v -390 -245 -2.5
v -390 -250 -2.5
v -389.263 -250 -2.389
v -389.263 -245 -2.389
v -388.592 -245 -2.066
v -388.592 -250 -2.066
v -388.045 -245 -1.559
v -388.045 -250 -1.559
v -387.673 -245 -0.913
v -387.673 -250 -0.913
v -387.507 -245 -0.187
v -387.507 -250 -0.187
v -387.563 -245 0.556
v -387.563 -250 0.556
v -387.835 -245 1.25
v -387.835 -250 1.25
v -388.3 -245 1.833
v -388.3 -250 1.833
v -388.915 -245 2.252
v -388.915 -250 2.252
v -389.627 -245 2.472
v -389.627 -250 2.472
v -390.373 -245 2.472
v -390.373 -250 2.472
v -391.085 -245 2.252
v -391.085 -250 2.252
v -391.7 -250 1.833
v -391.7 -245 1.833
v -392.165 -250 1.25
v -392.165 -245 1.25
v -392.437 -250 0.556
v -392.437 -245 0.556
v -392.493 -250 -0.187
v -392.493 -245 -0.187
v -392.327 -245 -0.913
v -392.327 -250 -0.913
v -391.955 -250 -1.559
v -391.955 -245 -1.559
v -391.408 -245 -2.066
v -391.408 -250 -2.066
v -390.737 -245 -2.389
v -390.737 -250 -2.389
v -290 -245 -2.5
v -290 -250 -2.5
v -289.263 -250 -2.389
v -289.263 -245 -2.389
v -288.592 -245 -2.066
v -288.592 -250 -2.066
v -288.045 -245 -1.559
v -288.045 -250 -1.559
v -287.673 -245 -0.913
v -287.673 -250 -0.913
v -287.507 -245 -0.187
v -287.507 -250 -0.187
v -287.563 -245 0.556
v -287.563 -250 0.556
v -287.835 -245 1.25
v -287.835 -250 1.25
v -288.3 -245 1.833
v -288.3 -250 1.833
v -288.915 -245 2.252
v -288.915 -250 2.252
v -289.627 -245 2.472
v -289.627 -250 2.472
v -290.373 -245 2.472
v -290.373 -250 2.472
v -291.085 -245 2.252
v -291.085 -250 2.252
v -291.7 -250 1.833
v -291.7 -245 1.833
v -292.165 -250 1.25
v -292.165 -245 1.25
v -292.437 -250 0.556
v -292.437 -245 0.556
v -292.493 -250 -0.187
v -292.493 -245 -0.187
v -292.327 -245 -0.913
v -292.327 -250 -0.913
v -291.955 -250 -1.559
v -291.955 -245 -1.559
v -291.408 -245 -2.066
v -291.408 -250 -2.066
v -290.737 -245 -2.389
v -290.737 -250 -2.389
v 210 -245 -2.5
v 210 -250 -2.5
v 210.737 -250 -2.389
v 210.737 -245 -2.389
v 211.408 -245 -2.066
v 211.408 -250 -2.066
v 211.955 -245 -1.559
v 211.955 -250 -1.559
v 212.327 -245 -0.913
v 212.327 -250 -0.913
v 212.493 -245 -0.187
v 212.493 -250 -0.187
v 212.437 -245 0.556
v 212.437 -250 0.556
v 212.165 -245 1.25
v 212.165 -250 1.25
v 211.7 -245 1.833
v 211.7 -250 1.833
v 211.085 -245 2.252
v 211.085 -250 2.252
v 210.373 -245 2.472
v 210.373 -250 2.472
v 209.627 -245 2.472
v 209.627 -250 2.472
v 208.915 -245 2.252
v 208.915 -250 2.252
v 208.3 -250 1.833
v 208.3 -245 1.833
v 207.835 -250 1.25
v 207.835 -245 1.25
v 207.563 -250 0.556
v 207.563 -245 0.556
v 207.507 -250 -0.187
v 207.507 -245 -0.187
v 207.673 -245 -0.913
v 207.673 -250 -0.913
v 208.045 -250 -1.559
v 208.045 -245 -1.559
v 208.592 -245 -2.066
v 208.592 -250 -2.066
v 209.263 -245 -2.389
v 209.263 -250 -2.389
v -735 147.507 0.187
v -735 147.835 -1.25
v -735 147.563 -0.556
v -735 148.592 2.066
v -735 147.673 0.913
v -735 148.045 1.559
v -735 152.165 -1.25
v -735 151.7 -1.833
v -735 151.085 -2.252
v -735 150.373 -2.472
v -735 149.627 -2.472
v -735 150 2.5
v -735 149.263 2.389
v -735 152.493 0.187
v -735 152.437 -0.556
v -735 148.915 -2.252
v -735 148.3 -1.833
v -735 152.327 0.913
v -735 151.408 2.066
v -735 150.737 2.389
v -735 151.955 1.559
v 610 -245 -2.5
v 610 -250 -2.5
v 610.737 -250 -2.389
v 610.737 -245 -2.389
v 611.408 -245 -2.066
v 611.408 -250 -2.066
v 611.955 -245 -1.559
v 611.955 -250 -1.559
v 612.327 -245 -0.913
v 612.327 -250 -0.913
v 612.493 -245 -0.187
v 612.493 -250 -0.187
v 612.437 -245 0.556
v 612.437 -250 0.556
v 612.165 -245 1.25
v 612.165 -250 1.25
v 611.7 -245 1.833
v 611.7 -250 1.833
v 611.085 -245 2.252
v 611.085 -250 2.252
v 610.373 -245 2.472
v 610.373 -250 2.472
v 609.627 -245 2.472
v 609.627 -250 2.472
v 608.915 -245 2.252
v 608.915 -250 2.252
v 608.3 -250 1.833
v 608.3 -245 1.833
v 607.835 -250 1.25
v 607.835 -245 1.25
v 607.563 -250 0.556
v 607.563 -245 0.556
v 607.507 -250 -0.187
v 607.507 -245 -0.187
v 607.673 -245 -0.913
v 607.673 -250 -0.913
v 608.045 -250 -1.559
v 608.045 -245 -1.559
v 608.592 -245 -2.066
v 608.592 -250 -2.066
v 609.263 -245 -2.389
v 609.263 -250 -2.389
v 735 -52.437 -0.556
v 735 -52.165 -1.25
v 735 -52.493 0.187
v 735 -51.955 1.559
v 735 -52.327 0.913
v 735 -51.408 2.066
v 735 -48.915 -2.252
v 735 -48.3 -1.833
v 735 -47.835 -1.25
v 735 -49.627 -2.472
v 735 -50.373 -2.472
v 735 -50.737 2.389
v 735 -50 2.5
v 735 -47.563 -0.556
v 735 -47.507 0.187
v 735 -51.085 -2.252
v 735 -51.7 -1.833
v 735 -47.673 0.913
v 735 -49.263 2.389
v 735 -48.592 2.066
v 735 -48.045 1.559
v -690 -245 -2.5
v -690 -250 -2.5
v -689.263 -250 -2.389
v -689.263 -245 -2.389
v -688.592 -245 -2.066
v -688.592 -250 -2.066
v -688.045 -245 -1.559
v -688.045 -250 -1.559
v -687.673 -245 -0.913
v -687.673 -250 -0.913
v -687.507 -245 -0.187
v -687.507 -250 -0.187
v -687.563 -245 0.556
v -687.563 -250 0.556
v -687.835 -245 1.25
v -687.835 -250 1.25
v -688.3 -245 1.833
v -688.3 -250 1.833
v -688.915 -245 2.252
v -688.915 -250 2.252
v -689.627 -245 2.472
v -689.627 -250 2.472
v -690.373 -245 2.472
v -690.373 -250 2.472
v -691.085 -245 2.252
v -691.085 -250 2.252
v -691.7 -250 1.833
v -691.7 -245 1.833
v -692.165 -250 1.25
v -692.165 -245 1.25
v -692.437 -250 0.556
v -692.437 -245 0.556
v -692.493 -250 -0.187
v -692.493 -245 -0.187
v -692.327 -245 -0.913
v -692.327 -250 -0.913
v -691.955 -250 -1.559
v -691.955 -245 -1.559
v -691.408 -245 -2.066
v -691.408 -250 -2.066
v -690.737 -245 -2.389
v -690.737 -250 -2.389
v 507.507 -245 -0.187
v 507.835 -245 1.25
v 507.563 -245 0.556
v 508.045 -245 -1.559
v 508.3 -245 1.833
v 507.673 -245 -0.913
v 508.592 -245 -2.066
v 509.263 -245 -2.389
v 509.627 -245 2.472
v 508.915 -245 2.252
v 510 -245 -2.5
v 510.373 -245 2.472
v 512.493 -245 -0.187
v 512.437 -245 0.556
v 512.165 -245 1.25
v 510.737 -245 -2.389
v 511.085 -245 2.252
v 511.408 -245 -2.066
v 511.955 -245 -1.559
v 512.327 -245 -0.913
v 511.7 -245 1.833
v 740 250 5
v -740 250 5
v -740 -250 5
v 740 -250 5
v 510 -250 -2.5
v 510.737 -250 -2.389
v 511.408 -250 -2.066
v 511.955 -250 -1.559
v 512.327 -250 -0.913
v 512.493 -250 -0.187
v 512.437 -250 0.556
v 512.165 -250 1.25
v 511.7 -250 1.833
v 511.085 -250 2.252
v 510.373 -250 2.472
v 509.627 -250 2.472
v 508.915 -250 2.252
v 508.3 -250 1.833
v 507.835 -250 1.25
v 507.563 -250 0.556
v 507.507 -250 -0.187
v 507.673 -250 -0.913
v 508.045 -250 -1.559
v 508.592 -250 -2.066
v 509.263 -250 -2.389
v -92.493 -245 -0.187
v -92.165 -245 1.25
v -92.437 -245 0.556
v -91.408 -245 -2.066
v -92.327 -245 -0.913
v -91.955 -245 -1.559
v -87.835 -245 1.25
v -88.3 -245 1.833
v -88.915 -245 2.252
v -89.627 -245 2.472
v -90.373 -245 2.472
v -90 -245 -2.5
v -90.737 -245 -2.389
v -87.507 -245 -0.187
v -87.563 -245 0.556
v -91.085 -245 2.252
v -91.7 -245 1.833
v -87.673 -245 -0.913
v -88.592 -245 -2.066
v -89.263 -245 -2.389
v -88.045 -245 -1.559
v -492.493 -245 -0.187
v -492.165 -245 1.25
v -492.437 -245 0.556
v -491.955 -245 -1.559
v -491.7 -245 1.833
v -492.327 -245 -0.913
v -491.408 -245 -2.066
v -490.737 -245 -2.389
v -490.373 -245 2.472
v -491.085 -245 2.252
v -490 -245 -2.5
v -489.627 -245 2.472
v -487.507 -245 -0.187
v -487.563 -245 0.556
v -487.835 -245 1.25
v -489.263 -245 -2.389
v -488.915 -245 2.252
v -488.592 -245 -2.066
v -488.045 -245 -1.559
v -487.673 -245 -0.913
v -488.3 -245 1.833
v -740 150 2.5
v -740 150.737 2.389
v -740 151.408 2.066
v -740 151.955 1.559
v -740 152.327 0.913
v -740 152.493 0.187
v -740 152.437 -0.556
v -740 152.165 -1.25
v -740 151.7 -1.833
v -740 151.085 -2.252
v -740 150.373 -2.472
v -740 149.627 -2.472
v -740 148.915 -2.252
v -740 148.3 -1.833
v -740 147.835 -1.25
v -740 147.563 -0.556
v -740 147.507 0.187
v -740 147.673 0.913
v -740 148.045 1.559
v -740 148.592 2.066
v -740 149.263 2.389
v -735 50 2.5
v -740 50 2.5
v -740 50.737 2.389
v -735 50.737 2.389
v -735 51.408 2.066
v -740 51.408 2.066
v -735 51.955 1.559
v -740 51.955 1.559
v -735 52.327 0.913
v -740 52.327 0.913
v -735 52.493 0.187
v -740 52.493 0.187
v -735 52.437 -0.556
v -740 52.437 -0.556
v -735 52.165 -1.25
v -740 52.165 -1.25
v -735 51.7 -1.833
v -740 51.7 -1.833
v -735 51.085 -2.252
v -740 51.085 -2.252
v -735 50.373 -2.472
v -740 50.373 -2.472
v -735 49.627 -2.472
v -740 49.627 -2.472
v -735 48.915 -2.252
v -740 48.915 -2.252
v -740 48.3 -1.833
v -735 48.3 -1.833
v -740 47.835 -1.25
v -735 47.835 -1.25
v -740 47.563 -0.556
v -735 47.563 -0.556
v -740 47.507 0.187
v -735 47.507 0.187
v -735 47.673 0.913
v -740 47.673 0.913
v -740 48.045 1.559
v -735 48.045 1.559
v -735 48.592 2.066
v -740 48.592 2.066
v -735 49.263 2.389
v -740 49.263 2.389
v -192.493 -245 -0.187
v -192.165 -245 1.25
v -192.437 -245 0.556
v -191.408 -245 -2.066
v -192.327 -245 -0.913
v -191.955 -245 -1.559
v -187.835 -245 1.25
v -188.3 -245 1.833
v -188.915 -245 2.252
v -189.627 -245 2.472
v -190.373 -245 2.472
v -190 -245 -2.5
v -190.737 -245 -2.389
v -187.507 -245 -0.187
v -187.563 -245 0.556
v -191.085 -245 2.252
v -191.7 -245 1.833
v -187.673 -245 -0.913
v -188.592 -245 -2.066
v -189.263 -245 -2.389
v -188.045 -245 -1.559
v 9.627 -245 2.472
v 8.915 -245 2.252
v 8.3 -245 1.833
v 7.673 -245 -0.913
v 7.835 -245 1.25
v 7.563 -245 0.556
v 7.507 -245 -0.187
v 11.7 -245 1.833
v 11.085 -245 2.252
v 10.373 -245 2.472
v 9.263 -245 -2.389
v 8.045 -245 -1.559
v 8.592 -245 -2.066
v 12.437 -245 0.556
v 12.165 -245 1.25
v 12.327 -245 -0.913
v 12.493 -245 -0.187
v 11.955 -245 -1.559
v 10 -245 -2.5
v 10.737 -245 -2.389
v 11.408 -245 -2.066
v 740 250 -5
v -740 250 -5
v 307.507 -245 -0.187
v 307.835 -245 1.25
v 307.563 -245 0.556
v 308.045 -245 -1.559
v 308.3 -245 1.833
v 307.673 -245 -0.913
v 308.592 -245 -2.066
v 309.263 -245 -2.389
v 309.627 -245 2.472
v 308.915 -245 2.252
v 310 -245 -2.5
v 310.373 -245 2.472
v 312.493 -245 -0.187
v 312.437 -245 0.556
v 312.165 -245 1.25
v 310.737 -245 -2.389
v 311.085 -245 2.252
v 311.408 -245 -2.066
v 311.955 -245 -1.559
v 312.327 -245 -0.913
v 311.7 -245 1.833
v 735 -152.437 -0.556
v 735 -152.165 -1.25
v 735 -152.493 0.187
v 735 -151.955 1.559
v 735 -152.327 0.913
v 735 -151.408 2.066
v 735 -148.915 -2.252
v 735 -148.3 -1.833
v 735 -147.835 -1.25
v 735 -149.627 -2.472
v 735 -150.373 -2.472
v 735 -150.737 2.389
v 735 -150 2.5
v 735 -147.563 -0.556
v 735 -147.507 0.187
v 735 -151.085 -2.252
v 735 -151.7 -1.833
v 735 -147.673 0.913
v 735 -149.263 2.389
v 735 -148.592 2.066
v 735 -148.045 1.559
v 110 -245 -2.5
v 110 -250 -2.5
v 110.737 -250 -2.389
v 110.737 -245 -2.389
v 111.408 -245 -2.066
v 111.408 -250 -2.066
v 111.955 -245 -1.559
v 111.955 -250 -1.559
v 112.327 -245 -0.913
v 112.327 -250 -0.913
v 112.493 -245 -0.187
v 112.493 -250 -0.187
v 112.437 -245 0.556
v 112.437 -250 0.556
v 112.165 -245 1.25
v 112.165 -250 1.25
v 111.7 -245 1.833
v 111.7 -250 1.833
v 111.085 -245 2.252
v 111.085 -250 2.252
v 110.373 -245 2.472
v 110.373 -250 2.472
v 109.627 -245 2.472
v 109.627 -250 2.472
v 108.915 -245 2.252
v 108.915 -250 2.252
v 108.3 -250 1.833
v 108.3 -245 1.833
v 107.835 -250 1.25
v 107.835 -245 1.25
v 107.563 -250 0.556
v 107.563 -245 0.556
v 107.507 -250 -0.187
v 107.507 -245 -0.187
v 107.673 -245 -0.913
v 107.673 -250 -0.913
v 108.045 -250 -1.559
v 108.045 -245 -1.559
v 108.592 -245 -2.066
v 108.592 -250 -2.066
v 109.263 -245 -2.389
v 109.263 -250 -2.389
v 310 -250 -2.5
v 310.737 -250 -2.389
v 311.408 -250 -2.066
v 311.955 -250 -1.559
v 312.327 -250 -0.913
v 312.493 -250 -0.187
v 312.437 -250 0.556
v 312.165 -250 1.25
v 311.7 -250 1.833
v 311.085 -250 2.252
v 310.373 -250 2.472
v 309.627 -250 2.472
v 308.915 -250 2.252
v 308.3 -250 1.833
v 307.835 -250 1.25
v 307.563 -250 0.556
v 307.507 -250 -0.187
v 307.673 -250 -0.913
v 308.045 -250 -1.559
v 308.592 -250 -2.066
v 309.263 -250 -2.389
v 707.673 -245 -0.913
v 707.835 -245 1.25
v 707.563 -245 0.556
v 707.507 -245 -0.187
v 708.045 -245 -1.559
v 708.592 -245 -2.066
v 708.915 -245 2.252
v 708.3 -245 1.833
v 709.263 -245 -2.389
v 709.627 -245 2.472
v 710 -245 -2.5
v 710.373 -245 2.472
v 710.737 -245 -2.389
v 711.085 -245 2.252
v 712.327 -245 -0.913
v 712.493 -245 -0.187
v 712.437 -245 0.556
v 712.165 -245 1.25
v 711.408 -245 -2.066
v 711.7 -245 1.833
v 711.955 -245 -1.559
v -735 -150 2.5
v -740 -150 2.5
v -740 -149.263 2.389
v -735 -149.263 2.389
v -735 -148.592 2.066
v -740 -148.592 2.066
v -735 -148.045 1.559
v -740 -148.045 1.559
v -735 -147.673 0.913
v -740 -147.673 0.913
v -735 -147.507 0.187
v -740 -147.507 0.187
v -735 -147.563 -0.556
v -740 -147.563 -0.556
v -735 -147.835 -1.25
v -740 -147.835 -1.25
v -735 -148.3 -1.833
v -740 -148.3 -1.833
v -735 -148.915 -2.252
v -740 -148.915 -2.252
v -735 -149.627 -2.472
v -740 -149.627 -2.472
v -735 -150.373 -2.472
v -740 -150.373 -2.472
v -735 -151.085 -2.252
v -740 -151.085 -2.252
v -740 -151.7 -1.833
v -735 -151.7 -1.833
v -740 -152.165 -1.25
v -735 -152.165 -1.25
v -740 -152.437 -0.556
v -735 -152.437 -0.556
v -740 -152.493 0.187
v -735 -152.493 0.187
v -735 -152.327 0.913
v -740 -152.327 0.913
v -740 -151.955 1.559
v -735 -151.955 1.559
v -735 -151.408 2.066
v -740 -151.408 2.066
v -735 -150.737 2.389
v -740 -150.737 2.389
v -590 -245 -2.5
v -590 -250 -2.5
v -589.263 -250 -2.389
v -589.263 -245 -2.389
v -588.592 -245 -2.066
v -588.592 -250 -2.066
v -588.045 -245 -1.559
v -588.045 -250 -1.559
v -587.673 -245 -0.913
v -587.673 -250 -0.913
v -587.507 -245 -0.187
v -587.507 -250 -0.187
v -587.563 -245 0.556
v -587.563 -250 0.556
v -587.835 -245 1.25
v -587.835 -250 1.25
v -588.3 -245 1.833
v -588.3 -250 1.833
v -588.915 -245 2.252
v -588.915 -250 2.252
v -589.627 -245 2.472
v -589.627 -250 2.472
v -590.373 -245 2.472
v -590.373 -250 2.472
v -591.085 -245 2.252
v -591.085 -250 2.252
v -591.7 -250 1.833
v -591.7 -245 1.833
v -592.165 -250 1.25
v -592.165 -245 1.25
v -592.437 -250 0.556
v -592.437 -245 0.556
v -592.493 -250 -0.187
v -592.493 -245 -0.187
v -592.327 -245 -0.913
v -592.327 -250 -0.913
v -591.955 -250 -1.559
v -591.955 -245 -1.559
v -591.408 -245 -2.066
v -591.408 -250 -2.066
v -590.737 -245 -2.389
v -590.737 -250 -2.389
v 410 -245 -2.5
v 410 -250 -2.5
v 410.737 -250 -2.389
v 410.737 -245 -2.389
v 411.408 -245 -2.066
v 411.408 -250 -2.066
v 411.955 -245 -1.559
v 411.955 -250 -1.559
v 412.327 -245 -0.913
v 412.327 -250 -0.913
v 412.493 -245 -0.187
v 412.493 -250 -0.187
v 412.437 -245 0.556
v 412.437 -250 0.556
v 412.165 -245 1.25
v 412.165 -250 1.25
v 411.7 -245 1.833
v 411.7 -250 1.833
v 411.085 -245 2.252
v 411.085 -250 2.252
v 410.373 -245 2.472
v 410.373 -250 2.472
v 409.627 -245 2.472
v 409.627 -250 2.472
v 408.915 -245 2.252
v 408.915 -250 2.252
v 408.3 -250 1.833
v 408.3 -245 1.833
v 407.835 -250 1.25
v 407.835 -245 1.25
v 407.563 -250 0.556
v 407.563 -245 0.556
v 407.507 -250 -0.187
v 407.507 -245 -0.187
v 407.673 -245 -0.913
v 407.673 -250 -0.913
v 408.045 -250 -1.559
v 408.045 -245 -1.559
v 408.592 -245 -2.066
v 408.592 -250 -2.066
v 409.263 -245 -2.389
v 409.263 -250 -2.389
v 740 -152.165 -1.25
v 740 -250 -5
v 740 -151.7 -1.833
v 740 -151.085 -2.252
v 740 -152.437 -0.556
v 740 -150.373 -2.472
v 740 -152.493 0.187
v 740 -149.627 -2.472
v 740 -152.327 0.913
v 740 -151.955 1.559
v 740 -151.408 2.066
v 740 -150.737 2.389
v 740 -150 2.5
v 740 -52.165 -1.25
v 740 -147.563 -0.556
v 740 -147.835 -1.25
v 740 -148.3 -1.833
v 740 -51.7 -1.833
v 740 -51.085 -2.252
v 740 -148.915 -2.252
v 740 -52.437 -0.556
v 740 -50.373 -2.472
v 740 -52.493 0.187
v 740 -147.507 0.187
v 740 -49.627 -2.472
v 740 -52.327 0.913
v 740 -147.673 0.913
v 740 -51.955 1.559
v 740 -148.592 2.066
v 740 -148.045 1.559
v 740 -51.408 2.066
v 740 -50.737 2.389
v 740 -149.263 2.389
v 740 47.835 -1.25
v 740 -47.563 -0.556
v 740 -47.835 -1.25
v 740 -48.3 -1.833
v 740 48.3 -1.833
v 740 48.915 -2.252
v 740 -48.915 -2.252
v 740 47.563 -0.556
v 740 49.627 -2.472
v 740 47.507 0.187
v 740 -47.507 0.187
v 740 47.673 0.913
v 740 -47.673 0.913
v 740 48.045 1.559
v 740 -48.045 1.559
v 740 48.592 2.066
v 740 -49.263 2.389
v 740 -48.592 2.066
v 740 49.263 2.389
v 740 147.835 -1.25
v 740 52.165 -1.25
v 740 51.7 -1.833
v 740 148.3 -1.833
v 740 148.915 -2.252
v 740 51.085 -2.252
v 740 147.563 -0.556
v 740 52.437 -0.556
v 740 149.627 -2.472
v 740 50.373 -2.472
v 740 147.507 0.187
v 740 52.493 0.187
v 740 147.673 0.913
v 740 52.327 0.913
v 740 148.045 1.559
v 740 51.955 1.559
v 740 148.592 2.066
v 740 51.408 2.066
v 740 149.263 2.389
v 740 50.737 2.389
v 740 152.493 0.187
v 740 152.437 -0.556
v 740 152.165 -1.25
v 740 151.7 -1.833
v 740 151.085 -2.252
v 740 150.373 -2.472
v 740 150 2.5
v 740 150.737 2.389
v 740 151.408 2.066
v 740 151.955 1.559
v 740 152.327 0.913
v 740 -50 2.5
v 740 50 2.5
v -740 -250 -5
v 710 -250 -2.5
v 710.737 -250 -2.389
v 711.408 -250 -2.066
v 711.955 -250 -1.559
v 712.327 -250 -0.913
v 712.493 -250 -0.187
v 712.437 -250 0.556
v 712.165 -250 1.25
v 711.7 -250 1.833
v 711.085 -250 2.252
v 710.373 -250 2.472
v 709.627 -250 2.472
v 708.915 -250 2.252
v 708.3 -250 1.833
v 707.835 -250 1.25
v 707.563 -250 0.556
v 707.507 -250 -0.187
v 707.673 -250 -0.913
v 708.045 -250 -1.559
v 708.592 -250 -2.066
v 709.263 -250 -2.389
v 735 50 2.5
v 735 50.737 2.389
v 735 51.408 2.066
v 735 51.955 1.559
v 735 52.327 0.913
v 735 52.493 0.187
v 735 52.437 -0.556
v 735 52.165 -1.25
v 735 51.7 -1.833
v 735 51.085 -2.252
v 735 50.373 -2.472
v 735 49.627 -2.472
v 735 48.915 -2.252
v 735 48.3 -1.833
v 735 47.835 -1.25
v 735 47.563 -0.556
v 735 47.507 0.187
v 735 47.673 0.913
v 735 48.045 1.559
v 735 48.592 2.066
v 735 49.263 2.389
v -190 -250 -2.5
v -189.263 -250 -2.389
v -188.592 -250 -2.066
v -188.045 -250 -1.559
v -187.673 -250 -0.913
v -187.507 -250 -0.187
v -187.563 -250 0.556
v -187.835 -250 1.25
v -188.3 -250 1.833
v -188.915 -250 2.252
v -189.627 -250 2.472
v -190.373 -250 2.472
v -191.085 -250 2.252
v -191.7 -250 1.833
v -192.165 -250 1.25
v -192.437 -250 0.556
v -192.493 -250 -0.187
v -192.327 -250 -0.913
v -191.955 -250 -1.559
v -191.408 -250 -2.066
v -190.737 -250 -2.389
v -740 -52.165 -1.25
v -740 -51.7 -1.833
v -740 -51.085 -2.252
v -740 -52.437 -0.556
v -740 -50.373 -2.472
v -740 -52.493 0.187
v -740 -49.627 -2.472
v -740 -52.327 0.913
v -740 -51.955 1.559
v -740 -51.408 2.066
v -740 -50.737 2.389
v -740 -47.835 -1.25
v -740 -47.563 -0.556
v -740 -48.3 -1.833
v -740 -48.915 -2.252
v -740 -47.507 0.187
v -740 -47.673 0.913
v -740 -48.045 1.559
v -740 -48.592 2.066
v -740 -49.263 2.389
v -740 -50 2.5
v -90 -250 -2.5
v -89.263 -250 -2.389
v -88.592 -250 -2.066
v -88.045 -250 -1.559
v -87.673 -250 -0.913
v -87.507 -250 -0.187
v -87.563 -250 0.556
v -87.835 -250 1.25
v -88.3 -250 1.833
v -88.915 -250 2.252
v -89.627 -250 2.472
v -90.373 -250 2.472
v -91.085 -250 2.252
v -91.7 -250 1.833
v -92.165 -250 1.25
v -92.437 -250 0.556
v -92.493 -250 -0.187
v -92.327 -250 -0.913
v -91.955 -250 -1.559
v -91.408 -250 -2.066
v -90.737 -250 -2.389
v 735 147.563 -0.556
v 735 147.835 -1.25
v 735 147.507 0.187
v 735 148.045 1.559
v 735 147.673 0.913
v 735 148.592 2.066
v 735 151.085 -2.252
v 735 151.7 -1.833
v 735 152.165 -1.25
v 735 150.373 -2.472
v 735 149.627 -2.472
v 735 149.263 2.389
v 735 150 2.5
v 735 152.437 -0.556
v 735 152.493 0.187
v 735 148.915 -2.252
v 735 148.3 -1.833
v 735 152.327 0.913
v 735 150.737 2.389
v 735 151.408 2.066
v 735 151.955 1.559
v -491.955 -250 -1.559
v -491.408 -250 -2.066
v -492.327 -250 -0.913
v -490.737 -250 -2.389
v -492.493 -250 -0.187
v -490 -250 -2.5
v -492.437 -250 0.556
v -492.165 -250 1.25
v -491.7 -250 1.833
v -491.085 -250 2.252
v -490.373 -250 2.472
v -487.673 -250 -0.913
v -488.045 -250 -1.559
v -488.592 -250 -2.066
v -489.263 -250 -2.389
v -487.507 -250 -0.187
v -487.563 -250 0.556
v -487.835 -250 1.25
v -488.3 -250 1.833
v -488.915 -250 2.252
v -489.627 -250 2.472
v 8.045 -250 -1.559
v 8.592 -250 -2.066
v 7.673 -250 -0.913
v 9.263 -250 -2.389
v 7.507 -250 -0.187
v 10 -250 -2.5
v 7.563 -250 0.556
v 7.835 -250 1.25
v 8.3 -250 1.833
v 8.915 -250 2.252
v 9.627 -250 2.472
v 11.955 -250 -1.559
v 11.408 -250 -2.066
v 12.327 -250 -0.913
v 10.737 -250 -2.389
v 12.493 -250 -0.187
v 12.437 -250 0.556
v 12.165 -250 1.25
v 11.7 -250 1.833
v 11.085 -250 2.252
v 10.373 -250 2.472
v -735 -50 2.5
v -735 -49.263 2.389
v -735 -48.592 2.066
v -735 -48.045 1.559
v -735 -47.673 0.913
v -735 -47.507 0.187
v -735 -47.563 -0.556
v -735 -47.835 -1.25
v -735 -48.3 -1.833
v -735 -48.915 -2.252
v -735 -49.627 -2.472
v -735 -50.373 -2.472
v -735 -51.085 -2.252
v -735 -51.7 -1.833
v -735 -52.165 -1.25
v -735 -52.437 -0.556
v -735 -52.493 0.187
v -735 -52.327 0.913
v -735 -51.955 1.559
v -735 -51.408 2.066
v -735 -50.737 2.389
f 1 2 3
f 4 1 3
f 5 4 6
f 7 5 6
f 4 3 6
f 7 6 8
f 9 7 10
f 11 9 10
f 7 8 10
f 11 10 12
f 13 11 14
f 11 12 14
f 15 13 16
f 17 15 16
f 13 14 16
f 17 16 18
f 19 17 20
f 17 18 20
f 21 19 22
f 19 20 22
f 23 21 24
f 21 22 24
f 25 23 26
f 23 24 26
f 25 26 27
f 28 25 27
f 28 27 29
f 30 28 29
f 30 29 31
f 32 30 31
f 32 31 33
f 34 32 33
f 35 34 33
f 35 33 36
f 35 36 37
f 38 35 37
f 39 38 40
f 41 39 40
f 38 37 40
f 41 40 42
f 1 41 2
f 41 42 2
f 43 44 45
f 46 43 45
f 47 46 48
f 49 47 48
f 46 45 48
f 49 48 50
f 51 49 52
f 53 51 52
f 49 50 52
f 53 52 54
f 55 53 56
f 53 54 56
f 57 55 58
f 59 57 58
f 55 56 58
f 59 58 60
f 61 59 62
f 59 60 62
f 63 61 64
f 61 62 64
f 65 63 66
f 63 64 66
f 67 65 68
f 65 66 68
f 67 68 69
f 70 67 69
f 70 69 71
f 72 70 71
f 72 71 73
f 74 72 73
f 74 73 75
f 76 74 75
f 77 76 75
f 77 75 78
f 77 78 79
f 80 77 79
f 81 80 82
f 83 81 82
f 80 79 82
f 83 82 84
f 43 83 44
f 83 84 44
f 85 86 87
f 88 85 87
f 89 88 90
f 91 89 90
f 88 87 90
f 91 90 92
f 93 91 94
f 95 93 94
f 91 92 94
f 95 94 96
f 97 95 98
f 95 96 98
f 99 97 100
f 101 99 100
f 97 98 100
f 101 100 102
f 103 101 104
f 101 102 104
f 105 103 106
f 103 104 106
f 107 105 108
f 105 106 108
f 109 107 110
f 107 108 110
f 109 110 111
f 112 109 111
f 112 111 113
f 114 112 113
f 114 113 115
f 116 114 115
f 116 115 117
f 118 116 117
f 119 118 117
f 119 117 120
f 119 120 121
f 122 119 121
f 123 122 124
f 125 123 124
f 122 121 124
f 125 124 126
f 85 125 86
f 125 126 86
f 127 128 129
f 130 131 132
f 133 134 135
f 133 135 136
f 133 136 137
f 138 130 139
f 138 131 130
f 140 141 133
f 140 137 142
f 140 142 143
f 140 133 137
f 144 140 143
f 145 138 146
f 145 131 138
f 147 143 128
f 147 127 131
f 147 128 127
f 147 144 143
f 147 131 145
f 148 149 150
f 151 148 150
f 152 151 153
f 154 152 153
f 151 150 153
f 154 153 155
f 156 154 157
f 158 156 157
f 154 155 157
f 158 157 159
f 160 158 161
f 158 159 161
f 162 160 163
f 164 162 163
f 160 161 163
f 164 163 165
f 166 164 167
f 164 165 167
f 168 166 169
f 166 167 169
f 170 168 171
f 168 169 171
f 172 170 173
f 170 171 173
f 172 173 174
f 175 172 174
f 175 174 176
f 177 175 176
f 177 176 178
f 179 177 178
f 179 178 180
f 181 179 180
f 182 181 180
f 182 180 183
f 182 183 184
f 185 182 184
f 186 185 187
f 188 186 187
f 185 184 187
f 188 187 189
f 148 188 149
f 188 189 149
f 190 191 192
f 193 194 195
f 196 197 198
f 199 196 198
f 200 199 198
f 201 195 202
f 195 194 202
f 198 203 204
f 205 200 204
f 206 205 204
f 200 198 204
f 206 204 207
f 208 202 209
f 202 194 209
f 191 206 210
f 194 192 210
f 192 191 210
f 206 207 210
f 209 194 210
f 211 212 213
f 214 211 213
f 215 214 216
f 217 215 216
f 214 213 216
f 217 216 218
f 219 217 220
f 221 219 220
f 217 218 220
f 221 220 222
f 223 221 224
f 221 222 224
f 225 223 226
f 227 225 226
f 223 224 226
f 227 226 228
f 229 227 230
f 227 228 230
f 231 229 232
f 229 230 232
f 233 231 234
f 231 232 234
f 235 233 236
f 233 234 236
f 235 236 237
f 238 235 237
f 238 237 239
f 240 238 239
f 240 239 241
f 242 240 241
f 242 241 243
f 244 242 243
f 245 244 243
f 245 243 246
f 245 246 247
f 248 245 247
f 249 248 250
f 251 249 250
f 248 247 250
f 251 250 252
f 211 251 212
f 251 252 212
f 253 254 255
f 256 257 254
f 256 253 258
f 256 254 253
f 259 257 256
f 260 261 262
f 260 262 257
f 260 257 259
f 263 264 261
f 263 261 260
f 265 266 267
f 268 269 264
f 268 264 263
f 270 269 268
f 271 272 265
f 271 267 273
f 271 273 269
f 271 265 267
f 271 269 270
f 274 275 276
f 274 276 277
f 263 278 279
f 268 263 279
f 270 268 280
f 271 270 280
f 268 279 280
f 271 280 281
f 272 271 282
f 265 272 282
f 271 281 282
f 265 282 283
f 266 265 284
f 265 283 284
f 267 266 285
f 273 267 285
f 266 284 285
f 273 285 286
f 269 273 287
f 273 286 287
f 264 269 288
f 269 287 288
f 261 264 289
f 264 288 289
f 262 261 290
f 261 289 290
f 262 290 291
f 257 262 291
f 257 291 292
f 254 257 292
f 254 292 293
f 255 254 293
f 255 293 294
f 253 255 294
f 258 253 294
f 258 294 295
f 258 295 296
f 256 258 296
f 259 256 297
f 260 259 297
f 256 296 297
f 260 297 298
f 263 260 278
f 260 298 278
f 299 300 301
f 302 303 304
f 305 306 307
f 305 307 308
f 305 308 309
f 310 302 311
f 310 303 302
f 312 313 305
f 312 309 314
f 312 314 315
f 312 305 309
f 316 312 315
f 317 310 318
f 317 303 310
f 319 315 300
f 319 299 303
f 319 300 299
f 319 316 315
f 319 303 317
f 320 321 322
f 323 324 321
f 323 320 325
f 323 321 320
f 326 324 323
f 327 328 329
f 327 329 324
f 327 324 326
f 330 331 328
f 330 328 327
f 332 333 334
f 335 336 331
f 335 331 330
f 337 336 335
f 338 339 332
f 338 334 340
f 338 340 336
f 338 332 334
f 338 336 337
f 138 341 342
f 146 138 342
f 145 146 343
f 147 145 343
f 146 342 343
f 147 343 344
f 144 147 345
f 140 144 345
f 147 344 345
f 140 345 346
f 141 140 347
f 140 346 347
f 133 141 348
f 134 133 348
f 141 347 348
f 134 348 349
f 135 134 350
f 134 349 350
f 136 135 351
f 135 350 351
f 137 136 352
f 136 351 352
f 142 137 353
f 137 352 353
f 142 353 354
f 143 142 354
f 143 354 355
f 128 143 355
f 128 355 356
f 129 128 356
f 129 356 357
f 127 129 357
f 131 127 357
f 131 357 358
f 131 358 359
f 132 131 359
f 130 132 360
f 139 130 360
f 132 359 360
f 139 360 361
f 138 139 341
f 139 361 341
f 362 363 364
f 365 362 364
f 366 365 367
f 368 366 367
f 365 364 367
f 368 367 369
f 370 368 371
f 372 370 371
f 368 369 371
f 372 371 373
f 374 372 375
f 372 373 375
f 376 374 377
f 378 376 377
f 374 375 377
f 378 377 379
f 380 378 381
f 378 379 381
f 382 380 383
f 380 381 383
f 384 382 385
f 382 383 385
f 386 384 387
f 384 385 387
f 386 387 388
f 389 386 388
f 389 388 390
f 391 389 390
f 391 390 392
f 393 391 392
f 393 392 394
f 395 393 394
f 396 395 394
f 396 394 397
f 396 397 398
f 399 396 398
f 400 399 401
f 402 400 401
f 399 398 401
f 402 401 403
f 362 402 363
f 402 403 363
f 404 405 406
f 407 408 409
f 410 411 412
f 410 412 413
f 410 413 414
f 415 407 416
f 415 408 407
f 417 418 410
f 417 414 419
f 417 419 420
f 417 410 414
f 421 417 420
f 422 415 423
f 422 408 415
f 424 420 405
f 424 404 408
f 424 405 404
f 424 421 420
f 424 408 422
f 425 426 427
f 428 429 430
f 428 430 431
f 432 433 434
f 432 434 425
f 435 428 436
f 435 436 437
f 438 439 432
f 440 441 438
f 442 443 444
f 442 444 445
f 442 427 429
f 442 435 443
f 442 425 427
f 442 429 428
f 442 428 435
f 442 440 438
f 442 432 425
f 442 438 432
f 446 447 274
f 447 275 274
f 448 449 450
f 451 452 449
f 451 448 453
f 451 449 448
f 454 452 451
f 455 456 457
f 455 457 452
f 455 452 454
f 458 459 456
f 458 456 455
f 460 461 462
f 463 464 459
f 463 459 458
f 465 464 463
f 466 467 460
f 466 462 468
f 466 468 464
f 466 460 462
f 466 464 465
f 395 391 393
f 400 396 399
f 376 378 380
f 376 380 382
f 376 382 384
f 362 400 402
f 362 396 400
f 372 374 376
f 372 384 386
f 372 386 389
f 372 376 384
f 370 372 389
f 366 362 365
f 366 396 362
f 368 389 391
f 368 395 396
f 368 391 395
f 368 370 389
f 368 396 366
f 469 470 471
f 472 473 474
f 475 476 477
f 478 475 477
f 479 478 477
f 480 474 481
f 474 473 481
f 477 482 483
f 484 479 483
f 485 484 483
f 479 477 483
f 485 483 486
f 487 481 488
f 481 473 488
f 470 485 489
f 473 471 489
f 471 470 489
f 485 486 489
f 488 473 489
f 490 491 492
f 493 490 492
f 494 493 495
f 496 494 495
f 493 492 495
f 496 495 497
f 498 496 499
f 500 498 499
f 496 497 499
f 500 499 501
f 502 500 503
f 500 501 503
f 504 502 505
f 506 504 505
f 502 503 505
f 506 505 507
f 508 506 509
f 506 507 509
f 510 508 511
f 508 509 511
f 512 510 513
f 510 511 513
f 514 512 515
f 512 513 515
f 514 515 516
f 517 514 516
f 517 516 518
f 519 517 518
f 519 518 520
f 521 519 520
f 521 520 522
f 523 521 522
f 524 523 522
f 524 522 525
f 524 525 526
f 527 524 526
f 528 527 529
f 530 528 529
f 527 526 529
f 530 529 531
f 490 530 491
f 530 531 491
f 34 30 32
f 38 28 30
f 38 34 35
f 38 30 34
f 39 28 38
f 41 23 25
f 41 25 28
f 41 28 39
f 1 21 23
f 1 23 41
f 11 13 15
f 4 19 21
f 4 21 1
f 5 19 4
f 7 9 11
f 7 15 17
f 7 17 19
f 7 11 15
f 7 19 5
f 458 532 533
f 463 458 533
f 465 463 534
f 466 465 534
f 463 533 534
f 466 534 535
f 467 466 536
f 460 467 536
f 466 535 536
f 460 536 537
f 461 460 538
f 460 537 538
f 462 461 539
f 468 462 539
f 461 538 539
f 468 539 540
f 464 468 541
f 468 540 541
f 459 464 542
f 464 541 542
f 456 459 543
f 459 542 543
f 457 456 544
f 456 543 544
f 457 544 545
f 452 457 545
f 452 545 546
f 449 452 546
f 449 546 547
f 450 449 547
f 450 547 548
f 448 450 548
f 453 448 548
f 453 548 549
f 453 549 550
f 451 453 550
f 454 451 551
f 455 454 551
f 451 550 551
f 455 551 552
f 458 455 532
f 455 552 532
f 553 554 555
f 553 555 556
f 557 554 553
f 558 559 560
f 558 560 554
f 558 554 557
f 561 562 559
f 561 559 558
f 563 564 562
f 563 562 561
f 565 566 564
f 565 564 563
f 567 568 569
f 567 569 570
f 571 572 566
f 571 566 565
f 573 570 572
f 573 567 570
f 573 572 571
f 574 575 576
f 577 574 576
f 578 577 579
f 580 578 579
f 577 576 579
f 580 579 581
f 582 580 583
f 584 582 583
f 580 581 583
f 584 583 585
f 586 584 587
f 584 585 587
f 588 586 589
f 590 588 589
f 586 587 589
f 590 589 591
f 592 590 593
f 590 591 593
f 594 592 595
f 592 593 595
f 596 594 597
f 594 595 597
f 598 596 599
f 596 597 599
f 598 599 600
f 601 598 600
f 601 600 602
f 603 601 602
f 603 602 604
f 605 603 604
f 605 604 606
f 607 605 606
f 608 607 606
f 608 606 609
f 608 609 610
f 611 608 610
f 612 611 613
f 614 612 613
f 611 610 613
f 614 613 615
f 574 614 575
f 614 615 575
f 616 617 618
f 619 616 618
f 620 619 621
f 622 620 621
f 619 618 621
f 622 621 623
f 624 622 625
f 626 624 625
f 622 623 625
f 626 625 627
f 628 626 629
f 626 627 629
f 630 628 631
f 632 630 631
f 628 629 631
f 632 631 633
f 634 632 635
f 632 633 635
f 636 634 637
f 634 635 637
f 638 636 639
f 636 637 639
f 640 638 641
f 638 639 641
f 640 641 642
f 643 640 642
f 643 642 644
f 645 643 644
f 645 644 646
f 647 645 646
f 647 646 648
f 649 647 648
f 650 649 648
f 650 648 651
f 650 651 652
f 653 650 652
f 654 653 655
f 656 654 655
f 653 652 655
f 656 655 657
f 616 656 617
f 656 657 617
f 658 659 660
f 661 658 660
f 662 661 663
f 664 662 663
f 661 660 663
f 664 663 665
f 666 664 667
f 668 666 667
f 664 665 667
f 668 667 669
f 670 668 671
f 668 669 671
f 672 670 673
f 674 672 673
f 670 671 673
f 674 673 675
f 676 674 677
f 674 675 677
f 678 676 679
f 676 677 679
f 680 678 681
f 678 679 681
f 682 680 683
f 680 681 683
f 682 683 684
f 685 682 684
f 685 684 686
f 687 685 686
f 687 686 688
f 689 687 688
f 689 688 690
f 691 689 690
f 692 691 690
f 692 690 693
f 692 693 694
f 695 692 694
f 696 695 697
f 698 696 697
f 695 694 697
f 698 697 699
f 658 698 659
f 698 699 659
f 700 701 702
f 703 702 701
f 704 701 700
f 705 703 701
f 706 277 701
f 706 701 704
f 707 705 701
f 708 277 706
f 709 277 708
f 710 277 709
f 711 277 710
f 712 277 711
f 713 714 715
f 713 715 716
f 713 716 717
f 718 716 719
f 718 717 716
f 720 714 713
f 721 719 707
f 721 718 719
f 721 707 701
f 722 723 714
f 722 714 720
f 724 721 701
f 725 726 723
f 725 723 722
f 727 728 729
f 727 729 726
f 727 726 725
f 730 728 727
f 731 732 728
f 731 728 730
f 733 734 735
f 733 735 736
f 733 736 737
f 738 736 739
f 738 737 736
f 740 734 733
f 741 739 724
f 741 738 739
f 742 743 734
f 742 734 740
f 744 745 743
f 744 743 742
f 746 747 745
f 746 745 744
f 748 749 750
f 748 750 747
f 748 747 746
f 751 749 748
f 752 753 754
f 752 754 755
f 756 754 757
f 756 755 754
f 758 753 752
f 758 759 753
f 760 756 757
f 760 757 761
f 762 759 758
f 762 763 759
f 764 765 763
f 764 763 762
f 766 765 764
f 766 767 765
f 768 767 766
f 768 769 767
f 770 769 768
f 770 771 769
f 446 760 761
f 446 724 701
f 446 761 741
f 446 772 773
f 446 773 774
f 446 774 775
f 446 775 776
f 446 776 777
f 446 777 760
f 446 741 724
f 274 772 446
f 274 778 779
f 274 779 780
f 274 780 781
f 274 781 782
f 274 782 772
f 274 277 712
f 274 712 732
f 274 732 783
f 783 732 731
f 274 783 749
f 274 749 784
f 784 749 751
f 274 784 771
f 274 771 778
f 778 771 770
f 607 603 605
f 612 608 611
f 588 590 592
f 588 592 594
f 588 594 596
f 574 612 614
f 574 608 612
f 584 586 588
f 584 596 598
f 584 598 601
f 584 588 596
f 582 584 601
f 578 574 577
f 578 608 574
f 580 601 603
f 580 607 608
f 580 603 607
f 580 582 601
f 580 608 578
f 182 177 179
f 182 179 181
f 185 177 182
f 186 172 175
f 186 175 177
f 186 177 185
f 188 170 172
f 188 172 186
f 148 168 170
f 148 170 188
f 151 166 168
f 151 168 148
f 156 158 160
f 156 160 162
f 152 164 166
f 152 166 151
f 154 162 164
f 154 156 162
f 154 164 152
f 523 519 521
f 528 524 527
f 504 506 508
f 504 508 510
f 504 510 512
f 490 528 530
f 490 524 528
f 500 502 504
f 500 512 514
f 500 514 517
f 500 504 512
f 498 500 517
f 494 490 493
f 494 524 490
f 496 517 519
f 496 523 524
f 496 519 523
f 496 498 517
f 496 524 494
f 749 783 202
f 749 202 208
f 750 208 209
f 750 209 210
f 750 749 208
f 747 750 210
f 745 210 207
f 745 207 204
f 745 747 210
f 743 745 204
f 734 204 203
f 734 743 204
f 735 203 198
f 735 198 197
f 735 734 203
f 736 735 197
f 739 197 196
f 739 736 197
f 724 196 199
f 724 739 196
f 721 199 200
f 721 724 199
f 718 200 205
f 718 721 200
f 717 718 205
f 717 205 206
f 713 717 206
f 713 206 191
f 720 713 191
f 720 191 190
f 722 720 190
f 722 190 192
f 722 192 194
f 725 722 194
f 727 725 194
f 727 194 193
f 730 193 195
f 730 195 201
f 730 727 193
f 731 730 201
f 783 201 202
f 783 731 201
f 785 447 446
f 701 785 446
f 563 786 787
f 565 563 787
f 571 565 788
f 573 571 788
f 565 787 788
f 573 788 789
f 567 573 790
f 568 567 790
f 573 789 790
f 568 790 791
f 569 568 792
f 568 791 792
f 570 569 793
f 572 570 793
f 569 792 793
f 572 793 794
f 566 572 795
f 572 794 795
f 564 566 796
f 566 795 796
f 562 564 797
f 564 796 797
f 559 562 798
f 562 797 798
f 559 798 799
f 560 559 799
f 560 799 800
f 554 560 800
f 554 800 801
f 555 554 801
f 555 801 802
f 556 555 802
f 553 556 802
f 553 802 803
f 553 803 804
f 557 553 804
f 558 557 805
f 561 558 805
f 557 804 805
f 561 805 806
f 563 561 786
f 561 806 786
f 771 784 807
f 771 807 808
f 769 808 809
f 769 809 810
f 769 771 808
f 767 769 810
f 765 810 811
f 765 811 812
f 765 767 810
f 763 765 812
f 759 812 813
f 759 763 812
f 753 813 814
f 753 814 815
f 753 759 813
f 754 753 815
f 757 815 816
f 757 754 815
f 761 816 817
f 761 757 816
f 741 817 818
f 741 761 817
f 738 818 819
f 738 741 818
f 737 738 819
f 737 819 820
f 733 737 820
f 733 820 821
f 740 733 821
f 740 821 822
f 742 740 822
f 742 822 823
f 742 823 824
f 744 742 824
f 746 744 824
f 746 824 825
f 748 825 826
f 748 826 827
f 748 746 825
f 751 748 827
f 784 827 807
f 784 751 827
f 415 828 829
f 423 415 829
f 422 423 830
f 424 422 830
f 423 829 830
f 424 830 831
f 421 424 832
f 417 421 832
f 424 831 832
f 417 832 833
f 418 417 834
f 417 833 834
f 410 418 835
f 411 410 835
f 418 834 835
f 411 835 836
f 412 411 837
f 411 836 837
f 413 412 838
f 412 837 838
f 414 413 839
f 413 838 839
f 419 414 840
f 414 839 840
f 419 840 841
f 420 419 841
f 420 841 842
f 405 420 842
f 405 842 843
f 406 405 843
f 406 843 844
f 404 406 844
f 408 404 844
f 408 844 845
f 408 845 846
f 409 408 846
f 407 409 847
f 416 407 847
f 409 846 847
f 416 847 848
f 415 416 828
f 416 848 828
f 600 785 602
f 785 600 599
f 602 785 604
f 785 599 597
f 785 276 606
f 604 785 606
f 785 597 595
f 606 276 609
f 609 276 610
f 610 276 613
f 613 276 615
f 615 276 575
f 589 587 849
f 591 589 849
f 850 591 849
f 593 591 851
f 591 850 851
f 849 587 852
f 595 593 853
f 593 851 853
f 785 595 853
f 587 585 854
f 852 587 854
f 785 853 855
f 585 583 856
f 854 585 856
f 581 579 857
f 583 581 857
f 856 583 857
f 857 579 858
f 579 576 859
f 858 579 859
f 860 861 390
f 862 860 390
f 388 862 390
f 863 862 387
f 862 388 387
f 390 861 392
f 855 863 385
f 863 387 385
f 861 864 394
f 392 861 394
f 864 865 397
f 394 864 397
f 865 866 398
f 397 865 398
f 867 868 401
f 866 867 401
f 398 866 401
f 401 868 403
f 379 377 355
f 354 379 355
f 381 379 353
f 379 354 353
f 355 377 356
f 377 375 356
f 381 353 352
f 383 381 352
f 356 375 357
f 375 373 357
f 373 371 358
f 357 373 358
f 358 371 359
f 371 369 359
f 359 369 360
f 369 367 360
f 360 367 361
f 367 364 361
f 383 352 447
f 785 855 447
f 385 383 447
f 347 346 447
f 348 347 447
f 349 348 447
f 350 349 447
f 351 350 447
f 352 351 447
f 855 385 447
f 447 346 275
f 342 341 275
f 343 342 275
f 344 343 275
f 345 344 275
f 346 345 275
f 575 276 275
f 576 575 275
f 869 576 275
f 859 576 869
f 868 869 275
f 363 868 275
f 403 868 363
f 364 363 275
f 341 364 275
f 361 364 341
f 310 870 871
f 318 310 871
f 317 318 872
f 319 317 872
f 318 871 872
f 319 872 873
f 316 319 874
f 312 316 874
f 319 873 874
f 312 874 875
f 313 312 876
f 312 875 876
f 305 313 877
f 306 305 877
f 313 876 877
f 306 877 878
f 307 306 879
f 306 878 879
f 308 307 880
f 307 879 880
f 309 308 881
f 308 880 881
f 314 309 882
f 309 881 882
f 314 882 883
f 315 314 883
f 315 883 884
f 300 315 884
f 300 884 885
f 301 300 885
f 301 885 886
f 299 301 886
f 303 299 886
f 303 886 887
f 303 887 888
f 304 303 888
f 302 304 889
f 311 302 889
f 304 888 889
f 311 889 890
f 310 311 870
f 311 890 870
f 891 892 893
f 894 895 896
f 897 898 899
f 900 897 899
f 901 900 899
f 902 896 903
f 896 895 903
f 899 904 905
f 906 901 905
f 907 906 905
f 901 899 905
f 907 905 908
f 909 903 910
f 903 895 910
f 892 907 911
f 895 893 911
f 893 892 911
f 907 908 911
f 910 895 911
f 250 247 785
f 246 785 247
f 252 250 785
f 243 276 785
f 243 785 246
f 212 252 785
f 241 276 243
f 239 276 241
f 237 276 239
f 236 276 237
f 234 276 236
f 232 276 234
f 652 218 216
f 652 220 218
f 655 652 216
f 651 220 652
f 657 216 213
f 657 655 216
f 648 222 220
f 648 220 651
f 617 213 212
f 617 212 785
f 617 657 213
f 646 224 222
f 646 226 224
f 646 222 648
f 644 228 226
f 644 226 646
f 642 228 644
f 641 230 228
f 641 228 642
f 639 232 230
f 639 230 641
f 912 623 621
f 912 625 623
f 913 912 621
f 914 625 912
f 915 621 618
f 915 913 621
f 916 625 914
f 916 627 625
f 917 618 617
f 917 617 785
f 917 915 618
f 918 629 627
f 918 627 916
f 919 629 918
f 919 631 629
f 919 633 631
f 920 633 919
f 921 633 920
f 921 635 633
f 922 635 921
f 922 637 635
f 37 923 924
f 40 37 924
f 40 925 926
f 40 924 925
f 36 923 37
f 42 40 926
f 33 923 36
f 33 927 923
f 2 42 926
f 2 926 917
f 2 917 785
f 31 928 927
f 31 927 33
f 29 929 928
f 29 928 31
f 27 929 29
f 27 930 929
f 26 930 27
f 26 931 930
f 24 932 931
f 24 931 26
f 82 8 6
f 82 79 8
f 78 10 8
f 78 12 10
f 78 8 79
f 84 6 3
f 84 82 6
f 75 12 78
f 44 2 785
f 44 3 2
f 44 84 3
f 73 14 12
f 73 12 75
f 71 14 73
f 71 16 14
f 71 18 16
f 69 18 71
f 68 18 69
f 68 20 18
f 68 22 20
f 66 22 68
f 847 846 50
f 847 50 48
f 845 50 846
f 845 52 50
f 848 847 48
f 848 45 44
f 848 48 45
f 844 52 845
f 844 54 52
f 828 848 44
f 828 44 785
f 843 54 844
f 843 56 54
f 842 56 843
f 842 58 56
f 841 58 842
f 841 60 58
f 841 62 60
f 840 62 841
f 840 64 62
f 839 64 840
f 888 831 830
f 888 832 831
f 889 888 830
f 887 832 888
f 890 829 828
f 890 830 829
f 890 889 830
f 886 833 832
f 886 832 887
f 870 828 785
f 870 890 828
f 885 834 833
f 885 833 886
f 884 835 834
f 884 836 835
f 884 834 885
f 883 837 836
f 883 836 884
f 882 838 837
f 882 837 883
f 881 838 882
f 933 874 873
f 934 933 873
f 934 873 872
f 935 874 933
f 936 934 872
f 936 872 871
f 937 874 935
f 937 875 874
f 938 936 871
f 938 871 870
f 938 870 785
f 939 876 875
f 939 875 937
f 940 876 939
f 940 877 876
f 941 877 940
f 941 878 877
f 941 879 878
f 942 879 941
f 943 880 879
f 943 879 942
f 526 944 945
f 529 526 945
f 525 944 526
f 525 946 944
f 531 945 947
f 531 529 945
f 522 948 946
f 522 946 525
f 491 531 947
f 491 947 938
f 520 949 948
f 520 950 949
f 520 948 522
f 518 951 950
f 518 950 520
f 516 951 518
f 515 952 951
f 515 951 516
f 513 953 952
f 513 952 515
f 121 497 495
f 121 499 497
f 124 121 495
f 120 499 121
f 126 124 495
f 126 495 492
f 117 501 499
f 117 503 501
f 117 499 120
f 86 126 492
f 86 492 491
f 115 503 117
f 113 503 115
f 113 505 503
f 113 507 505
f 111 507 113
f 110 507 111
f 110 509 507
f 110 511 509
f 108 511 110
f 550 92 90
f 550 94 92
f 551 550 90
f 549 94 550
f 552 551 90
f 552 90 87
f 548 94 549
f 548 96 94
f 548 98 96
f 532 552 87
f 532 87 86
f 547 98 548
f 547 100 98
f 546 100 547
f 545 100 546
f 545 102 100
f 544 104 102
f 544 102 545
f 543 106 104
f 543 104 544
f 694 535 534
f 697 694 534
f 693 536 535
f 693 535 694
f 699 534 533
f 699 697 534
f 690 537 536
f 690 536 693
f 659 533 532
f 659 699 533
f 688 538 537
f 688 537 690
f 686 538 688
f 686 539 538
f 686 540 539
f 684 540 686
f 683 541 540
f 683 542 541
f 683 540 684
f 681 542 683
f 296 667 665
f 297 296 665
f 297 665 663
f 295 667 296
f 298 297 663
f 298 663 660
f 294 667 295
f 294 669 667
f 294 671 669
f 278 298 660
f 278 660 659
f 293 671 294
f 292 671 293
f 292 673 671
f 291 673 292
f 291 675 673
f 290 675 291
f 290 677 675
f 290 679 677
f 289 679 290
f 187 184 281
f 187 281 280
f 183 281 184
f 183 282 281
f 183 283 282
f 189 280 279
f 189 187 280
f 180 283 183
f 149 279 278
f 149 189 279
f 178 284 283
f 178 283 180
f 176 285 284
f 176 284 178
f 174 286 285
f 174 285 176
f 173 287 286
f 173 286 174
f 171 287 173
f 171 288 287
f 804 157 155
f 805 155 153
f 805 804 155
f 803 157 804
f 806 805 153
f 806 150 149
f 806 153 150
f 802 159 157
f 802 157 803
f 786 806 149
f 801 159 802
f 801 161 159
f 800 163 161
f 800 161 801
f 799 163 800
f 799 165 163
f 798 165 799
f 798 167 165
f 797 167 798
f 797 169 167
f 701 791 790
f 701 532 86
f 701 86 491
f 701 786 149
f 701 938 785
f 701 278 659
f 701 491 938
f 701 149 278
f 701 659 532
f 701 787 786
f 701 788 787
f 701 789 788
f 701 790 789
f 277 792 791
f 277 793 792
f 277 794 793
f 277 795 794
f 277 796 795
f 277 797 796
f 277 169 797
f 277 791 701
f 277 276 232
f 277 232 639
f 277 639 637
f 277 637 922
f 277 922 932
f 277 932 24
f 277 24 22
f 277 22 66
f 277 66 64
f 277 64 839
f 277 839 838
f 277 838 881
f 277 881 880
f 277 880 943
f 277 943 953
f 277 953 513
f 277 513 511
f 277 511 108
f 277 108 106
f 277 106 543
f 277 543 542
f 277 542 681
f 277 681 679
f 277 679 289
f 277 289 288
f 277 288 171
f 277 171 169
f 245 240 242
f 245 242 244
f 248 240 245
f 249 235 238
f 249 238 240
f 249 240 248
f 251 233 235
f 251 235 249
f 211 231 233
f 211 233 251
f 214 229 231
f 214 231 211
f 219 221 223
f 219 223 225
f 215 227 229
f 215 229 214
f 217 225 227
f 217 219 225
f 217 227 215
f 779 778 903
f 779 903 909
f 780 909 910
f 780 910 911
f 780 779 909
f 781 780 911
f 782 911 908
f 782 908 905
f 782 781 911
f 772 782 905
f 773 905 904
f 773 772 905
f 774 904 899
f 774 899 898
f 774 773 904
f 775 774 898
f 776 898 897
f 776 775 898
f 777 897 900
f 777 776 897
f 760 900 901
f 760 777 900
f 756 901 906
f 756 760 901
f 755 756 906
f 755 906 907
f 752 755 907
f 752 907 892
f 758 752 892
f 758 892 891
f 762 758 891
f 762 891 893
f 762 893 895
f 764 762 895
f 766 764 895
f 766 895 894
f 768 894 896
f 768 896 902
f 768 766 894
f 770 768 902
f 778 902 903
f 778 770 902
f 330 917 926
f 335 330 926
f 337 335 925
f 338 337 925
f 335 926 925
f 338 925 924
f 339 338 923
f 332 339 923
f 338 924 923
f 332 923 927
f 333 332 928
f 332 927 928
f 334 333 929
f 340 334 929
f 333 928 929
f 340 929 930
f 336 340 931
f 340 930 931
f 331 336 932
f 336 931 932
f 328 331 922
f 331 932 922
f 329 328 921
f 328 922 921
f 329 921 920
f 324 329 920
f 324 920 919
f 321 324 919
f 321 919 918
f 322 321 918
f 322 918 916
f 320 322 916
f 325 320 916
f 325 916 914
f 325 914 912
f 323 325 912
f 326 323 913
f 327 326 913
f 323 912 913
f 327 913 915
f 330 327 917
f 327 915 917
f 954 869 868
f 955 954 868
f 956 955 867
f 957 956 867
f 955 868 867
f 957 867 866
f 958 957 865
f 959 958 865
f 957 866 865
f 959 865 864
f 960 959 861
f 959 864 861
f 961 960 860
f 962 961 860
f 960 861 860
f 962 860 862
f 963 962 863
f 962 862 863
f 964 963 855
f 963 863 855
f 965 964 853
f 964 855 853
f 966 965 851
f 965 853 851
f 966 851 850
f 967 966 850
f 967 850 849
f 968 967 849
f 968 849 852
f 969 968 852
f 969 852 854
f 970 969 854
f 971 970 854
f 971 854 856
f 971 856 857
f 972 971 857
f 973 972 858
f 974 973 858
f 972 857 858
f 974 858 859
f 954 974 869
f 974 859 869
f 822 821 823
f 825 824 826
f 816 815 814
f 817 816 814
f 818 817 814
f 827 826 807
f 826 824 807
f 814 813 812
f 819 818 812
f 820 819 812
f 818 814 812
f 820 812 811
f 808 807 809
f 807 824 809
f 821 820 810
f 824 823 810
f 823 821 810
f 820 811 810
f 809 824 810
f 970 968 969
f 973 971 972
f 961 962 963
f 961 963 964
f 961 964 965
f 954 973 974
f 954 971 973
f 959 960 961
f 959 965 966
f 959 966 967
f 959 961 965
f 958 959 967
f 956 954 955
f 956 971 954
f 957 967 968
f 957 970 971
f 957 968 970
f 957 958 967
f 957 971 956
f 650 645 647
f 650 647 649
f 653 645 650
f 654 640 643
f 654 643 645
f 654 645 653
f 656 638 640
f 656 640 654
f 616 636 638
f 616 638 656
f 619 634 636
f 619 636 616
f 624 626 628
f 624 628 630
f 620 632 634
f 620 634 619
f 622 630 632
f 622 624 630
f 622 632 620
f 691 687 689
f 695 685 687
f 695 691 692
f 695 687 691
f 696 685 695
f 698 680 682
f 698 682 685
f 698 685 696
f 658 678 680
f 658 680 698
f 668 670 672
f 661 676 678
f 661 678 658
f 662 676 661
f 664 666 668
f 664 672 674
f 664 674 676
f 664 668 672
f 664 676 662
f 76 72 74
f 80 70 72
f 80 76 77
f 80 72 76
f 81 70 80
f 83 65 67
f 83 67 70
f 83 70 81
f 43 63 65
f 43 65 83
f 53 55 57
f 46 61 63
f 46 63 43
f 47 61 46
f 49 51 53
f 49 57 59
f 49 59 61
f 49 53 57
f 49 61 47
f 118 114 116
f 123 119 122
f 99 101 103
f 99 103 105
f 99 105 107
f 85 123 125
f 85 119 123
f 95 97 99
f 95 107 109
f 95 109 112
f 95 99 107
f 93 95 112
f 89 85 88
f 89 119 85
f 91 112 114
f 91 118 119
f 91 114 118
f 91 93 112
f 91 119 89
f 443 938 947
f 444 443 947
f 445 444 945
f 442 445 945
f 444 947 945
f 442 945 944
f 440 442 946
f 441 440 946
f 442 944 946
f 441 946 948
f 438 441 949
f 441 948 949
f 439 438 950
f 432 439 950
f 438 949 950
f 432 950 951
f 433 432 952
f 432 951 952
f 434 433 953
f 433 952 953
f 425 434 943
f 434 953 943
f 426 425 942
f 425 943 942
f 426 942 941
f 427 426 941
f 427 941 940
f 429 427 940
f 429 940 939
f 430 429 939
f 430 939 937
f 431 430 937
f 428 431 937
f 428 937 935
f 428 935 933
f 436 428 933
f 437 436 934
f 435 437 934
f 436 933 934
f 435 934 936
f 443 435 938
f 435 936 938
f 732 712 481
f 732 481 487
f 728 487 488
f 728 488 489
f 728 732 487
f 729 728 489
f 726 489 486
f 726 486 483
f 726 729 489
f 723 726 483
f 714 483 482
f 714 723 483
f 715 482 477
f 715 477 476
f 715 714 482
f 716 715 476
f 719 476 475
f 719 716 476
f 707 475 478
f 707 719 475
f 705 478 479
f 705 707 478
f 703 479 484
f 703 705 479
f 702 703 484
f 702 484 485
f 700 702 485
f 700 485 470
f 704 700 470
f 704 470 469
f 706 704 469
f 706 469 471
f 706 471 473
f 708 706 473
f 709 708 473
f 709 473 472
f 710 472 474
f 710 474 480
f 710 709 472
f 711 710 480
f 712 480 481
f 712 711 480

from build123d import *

# Parameters (mm, degrees)
CROQUIS1_W              = 1480
CROQUIS1_H              = 500
SALIENTE_EXTRUIR1_DEPTH = 5
CROQUIS2_R              = 2.5
CORTAR_EXTRUIR1_DEPTH   = 5
CROQUIS3_R              = 2.5
CORTAR_EXTRUIR2_DEPTH   = 5


with BuildPart() as part:
    # Croquis1 → Saliente-Extruir1 (new, symmetric)
    with BuildSketch(Plane.XY):
        Rectangle(CROQUIS1_W, CROQUIS1_H)
    extrude(amount=SALIENTE_EXTRUIR1_DEPTH, both=True)

    # Croquis2 → Cortar-Extruir1 (cut)
    with BuildSketch(Plane.XZ.offset(250)):
        with Locations(Location((-690, 0, 0), (0, 0, 270))):
            Circle(CROQUIS2_R)
        with Locations(Location((-590, 0, 0), (0, 0, 270))):
            Circle(CROQUIS2_R)
        with Locations(Location((-490, 0, 0), (0, 0, 270))):
            Circle(CROQUIS2_R)
        with Locations(Location((-390, 0, 0), (0, 0, 270))):
            Circle(CROQUIS2_R)
        with Locations(Location((-290, 0, 0), (0, 0, 270))):
            Circle(CROQUIS2_R)
        with Locations(Location((-190, 0, 0), (0, 0, 270))):
            Circle(CROQUIS2_R)
        with Locations(Location((-90, 0, 0), (0, 0, 270))):
            Circle(CROQUIS2_R)
        with Locations(Location((10, 0, 0), (0, 0, 270))):
            Circle(CROQUIS2_R)
        with Locations(Location((110, 0, 0), (0, 0, 270))):
            Circle(CROQUIS2_R)
        with Locations(Location((210, 0, 0), (0, 0, 270))):
            Circle(CROQUIS2_R)
        with Locations(Location((310, 0, 0), (0, 0, 270))):
            Circle(CROQUIS2_R)
        with Locations(Location((410, 0, 0), (0, 0, 270))):
            Circle(CROQUIS2_R)
        with Locations(Location((510, 0, 0), (0, 0, 270))):
            Circle(CROQUIS2_R)
        with Locations(Location((610, 0, 0), (0, 0, 270))):
            Circle(CROQUIS2_R)
        with Locations(Location((710, 0, 0), (0, 0, 270))):
            Circle(CROQUIS2_R)
    extrude(amount=-CORTAR_EXTRUIR1_DEPTH, mode=Mode.SUBTRACT)

    # Croquis3 → Cortar-Extruir2 (cut)
    with BuildSketch(Plane.ZY.offset(740)):
        with Locations((0, -150)):
            Circle(CROQUIS3_R)
        with Locations((0, -50)):
            Circle(CROQUIS3_R)
        with Locations((0, 50)):
            Circle(CROQUIS3_R)
        with Locations((0, 150)):
            Circle(CROQUIS3_R)
    cortar_extruir2 = extrude(amount=-CORTAR_EXTRUIR2_DEPTH, mode=Mode.SUBTRACT)

    # Simetría5: Cortar-Extruir2 across plane
    add(cortar_extruir2.mirror(Plane(origin=(0, 0, 0), x_dir=(0, 0, 1), z_dir=(1, 0, 0))), mode=Mode.SUBTRACT)


solid = part.part
